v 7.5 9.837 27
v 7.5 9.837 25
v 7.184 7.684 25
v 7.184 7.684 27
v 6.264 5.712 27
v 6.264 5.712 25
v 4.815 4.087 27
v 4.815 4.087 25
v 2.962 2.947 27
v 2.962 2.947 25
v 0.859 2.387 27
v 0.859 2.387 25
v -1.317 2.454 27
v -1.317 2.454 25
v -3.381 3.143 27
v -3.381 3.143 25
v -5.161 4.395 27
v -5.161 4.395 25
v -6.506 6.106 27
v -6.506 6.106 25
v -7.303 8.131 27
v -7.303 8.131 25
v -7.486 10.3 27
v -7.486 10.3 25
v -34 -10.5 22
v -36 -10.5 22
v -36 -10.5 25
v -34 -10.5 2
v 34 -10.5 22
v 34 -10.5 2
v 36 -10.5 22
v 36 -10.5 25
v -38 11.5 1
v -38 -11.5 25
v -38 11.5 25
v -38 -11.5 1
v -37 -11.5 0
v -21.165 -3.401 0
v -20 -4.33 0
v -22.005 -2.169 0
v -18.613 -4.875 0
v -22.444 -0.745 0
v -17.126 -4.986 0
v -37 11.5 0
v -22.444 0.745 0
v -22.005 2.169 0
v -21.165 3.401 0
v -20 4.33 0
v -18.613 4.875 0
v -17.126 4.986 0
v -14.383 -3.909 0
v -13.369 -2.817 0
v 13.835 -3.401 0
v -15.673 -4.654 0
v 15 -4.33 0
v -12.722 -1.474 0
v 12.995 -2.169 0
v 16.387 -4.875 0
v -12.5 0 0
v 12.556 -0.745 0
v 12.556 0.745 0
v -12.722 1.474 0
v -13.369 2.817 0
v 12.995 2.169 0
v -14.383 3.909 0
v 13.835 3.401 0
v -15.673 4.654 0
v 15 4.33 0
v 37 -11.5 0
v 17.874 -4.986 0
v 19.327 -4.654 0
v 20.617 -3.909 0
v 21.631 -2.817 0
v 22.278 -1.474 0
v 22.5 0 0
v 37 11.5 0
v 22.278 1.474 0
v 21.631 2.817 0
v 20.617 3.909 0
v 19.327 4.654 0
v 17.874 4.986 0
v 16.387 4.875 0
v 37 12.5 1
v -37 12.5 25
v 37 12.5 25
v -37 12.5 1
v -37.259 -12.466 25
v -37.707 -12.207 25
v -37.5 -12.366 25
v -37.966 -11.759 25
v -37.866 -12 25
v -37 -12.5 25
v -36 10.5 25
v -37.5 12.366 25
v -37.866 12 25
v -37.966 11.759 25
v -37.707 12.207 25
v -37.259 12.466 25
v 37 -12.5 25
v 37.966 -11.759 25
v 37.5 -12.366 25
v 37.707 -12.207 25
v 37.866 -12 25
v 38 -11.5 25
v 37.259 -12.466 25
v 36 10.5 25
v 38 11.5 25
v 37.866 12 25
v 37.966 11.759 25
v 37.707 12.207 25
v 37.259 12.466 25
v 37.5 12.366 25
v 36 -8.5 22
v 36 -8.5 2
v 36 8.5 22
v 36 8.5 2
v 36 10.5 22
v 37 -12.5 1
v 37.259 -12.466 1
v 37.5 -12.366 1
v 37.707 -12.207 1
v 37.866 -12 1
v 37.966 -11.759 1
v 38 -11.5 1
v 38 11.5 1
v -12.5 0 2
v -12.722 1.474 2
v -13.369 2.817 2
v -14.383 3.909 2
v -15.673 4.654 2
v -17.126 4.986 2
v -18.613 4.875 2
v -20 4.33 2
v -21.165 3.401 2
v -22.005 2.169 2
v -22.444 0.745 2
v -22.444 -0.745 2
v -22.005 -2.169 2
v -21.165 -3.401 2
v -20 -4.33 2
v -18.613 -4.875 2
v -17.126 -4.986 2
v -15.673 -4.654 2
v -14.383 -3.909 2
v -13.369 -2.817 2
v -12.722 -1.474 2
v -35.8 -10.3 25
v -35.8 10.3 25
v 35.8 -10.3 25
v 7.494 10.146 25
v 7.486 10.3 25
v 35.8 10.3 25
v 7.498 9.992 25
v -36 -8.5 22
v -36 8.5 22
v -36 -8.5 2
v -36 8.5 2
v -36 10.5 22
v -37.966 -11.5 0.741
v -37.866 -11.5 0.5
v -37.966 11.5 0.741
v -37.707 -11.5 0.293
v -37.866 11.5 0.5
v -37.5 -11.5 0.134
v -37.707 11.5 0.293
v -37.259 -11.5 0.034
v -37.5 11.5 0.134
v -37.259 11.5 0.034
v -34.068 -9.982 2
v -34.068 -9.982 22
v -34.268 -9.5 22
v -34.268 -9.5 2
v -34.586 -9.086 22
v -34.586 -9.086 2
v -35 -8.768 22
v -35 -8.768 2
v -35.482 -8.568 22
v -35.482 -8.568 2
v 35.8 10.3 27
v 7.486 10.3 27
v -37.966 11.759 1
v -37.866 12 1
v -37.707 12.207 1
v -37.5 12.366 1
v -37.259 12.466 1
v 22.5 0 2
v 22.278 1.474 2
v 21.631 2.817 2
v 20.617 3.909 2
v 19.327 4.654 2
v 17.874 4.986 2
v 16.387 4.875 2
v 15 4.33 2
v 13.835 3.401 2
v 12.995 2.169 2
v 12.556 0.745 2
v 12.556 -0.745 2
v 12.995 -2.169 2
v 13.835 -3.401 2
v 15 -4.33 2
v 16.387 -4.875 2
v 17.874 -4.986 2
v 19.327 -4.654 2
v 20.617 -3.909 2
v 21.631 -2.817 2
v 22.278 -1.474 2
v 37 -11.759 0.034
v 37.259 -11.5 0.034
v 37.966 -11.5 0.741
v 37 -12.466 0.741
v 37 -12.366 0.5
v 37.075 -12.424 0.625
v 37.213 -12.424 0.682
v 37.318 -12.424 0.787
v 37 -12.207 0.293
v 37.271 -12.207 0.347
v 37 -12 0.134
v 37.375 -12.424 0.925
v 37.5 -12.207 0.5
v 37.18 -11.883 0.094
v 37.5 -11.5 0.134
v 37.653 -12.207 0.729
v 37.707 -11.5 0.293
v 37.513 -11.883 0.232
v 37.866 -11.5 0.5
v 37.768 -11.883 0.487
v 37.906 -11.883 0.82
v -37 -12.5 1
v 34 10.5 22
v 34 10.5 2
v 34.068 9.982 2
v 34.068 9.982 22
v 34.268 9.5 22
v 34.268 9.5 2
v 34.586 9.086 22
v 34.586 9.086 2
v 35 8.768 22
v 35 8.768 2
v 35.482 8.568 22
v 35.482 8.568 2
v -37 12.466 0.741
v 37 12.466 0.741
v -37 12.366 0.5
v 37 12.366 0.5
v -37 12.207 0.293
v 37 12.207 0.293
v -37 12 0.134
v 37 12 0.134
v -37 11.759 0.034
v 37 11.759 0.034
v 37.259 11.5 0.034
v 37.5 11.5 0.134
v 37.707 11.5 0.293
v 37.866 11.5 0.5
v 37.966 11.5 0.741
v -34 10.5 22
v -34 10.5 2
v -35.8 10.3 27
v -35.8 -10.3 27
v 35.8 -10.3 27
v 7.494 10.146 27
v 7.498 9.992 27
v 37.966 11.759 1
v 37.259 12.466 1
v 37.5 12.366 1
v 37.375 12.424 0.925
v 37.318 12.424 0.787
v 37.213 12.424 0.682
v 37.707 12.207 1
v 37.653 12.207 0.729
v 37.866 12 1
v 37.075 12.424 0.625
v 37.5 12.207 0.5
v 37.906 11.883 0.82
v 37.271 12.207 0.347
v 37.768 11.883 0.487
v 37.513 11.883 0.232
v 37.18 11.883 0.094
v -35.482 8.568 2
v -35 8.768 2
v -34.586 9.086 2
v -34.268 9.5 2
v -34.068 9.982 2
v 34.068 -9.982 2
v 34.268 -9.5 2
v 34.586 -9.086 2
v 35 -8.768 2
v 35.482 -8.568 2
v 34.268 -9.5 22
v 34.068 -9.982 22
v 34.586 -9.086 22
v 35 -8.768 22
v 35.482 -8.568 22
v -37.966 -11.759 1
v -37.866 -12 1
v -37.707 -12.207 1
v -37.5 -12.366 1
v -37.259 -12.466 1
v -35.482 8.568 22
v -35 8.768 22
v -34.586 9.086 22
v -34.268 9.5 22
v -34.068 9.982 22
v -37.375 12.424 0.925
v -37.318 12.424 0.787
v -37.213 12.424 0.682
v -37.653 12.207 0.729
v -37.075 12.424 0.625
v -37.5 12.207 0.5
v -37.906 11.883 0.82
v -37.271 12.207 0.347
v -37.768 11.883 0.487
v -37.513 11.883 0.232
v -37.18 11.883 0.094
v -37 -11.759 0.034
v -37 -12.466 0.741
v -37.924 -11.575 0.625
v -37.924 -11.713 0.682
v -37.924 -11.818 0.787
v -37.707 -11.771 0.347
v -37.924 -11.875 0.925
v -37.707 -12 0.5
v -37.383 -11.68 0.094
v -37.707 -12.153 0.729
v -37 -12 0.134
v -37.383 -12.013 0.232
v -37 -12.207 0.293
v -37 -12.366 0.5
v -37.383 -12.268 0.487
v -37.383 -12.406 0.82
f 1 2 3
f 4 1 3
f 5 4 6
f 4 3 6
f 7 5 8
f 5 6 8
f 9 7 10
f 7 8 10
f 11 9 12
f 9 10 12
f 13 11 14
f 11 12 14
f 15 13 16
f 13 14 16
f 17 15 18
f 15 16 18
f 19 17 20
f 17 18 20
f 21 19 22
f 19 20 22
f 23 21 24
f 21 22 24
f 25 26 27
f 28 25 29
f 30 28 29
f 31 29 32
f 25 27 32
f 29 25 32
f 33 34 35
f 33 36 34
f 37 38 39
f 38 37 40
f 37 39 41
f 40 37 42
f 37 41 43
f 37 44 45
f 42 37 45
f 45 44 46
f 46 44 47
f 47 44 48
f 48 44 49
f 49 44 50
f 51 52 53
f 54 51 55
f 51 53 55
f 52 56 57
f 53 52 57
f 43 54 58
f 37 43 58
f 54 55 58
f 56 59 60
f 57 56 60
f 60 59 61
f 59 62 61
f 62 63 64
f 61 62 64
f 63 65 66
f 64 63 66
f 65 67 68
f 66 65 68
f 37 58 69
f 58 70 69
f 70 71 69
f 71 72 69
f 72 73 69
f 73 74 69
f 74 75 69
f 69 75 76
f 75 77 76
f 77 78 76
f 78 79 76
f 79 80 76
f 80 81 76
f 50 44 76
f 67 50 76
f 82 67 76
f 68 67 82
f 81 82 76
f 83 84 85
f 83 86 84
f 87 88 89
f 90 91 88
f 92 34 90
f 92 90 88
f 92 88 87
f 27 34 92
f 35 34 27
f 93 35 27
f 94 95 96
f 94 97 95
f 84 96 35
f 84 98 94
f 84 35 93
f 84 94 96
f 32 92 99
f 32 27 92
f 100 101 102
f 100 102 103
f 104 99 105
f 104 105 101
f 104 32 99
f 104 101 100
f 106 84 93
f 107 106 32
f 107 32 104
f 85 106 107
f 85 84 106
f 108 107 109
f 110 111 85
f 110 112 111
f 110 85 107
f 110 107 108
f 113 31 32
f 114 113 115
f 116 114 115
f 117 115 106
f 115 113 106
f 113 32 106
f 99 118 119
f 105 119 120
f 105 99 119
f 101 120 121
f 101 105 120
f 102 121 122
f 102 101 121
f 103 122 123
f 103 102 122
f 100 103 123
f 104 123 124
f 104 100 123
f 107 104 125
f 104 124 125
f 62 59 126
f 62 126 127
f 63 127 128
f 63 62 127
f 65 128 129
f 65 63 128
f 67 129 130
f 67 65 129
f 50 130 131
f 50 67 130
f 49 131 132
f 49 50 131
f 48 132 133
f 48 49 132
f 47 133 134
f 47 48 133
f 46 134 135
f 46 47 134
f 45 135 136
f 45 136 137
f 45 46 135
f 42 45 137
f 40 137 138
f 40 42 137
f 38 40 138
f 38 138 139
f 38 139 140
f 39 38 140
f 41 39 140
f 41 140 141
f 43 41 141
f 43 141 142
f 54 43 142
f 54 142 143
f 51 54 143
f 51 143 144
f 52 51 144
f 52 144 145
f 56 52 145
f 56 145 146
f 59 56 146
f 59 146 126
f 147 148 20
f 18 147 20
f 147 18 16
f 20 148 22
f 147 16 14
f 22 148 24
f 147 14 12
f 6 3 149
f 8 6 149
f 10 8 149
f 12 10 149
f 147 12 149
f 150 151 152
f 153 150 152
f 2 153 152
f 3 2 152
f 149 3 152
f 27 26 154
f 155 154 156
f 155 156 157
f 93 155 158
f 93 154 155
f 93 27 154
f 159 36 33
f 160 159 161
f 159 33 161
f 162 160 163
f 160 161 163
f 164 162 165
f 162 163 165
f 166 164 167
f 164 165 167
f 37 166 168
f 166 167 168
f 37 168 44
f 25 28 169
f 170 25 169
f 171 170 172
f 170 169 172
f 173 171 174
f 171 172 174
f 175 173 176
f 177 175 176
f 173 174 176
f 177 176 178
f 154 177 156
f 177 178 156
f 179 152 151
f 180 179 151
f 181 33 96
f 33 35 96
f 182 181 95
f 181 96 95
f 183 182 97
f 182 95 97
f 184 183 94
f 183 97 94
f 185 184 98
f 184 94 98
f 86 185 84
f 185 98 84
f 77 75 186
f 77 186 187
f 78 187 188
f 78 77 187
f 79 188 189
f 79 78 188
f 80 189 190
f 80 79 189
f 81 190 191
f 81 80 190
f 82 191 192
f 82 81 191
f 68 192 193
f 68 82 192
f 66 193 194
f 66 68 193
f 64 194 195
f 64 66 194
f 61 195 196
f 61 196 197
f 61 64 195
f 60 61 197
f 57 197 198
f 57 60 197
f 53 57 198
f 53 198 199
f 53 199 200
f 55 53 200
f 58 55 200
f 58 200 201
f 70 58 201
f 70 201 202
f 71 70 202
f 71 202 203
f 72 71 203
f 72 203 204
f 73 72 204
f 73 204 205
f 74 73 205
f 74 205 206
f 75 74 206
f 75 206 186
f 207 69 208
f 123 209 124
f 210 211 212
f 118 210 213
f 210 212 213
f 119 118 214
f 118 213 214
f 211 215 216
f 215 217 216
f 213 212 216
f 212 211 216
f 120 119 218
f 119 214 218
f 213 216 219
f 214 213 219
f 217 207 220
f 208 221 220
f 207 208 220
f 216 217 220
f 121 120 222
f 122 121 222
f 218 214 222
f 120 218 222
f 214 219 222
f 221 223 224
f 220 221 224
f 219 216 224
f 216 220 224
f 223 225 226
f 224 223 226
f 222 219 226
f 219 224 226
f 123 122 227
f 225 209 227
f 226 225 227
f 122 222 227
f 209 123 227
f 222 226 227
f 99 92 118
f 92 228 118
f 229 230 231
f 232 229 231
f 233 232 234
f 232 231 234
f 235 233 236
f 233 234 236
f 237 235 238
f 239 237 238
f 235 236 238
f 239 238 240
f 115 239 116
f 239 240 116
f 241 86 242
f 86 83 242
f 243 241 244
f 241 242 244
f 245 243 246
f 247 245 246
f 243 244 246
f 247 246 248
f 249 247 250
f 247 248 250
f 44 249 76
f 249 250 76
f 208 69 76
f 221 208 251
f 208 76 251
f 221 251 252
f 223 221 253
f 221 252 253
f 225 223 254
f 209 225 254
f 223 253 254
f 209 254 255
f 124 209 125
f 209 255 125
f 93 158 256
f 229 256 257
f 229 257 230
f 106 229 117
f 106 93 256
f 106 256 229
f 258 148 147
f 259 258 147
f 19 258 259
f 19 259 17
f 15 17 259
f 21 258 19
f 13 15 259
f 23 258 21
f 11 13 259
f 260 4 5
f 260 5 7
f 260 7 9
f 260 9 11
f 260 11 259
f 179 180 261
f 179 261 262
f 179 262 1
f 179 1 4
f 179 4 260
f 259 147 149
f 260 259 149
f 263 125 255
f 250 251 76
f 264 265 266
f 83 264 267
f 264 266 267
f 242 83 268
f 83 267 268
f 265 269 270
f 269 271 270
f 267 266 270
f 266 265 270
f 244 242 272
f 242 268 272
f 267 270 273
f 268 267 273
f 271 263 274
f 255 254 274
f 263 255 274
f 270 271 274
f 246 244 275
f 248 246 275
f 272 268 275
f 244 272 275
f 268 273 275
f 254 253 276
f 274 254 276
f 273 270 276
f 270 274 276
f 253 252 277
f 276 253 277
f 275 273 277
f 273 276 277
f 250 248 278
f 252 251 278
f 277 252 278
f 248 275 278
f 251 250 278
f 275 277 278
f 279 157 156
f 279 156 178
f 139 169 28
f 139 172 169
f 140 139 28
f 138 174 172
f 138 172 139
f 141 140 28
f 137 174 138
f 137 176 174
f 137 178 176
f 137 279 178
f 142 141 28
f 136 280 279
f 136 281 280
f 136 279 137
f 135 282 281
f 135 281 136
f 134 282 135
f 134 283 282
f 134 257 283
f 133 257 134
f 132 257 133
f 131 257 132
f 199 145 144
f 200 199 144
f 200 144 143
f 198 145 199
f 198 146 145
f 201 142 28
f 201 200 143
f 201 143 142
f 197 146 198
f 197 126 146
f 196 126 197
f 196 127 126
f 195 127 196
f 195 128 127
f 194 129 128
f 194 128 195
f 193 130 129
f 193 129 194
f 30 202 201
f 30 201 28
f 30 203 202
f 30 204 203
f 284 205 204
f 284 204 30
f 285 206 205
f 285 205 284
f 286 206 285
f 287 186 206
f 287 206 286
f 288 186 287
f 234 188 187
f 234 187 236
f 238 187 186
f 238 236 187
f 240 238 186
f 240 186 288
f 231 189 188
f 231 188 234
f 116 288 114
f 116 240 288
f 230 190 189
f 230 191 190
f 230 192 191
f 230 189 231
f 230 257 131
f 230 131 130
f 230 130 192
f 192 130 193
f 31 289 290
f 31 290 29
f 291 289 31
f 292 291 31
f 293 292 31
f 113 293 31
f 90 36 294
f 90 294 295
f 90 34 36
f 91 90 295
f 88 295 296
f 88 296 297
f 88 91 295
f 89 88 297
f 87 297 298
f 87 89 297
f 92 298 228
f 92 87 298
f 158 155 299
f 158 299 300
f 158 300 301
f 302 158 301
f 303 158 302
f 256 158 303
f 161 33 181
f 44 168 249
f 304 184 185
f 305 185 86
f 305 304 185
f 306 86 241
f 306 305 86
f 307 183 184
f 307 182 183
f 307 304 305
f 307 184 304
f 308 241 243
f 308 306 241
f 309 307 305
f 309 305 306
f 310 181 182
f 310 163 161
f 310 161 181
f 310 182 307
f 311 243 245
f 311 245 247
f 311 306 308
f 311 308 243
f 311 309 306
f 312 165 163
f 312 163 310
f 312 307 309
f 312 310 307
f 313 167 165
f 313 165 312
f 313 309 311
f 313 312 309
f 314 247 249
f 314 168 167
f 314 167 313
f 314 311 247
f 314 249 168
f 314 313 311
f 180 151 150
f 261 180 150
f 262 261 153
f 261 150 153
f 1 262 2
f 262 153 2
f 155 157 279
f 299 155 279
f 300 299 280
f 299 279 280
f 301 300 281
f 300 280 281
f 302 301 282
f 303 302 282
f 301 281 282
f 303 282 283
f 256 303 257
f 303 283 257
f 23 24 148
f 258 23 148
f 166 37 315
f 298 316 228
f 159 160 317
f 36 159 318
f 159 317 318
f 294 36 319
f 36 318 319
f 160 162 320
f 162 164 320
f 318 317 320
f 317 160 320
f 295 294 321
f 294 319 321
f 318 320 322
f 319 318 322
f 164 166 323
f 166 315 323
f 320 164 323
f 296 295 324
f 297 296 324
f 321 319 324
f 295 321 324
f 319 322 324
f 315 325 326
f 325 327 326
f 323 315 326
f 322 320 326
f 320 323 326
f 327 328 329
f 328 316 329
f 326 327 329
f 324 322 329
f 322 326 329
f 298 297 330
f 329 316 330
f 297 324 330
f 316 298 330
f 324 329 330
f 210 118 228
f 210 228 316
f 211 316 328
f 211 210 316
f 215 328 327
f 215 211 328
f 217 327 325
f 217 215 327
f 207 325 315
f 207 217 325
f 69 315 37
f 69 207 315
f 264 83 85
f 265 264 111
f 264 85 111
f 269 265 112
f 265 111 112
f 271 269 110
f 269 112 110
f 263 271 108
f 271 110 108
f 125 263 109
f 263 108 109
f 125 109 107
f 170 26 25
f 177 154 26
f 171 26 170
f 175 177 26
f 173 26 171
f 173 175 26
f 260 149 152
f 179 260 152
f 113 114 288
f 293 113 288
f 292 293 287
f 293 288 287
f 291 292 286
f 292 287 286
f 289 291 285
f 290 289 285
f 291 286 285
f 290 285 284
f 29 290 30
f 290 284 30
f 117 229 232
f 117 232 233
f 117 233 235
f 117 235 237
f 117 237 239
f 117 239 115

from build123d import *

# Parameters (mm, degrees)
F0_W          = 76
F0_H          = 25
F0_R          = 5
F1_DEPTH      = 25
F2_W          = 72
F2_H          = 21
F2_R          = 5
F3_DEPTH      = 23
F6_DEPTH      = 2
F7_R          = 1
F8_DEPTH      = 20
F8_DEPTH_BACK = 1


with BuildPart() as f1:
    # F0 (on Top) → F1 (new body)
    with BuildSketch(Plane.XY):
        Rectangle(F0_W, F0_H)
        with Locations((-17.5, 0)):
            Circle(F0_R, mode=Mode.SUBTRACT)
        with Locations((17.5, 0)):
            Circle(F0_R, mode=Mode.SUBTRACT)
    extrude(amount=F1_DEPTH)

    # F2 (on face) → F3 (cut)
    with BuildSketch(Plane.XY.offset(25)):
        Rectangle(F2_W, F2_H)
        with Locations((-17.5, 0)):
            Circle(F2_R, mode=Mode.SUBTRACT)
        with Locations((17.5, 0)):
            Circle(F2_R, mode=Mode.SUBTRACT)
    extrude(amount=-F3_DEPTH, mode=Mode.SUBTRACT)

    # F7
    f7_edges = [f1.edges().sort_by_distance(p)[0] for p in [
        (38, 0, 0),
        (0, -12.5, 0),
        (-38, 0, 0),
        (38, -12.5, 12.5),
        (-38, -12.5, 12.5),
        (38, 12.5, 12.5),
        (-38, 12.5, 12.5),
        (0, 12.5, 0),
    ]]
    fillet(f7_edges, radius=F7_R)

    # F4 (on face) → F8 (join, two sides)
    with BuildSketch(Plane.XY.offset(2)) as f8_sk:
        with BuildLine():
            ThreePointArc((-36, 8.5), (-34.5857864376, 9.0857864376), (-34, 10.5))
            Line((-34, 10.5), (-36, 10.5))
            Line((-36, 10.5), (-36, 8.5))
        make_face()
        with BuildLine():
            ThreePointArc((-34, -10.5), (-34.5857864376, -9.0857864376), (-36, -8.5))
            Line((-36, -8.5), (-36, -10.5))
            Line((-36, -10.5), (-34, -10.5))
        make_face()
        with BuildLine():
            Line((36, -10.5), (36, -8.5))
            ThreePointArc((36, -8.5), (34.5857864376, -9.0857864376), (34, -10.5))
            Line((34, -10.5), (36, -10.5))
        make_face()
        with BuildLine():
            Line((36, 10.5), (34, 10.5))
            ThreePointArc((34, 10.5), (34.5857864376, 9.0857864376), (36, 8.5))
            Line((36, 8.5), (36, 10.5))
        make_face()
    extrude(amount=F8_DEPTH)
    extrude(f8_sk.sketch, amount=-F8_DEPTH_BACK)


with BuildPart() as f6:
    # F5 (on face) → F6 (new body)
    with BuildSketch(Plane.XY.offset(25)):
        with BuildLine():
            Line((-35.8, -10.3), (35.8, -10.3))
            Line((35.8, -10.3), (35.8, 10.3))
            Line((35.8, 10.3), (7.4857194286, 10.3))
            ThreePointArc((7.4857194286, 10.3), (7.496429007, 10.0688070079), (7.5, 9.8373936489))
            ThreePointArc((7.5, 9.8373936489), (-0.2314133589, 2.3409646419), (-7.4857194286, 10.3))
            Line((-7.4857194286, 10.3), (-35.8, 10.3))
            Line((-35.8, 10.3), (-35.8, -10.3))
        make_face()
    extrude(amount=F6_DEPTH)


solid = Compound([f1.part, f6.part])
